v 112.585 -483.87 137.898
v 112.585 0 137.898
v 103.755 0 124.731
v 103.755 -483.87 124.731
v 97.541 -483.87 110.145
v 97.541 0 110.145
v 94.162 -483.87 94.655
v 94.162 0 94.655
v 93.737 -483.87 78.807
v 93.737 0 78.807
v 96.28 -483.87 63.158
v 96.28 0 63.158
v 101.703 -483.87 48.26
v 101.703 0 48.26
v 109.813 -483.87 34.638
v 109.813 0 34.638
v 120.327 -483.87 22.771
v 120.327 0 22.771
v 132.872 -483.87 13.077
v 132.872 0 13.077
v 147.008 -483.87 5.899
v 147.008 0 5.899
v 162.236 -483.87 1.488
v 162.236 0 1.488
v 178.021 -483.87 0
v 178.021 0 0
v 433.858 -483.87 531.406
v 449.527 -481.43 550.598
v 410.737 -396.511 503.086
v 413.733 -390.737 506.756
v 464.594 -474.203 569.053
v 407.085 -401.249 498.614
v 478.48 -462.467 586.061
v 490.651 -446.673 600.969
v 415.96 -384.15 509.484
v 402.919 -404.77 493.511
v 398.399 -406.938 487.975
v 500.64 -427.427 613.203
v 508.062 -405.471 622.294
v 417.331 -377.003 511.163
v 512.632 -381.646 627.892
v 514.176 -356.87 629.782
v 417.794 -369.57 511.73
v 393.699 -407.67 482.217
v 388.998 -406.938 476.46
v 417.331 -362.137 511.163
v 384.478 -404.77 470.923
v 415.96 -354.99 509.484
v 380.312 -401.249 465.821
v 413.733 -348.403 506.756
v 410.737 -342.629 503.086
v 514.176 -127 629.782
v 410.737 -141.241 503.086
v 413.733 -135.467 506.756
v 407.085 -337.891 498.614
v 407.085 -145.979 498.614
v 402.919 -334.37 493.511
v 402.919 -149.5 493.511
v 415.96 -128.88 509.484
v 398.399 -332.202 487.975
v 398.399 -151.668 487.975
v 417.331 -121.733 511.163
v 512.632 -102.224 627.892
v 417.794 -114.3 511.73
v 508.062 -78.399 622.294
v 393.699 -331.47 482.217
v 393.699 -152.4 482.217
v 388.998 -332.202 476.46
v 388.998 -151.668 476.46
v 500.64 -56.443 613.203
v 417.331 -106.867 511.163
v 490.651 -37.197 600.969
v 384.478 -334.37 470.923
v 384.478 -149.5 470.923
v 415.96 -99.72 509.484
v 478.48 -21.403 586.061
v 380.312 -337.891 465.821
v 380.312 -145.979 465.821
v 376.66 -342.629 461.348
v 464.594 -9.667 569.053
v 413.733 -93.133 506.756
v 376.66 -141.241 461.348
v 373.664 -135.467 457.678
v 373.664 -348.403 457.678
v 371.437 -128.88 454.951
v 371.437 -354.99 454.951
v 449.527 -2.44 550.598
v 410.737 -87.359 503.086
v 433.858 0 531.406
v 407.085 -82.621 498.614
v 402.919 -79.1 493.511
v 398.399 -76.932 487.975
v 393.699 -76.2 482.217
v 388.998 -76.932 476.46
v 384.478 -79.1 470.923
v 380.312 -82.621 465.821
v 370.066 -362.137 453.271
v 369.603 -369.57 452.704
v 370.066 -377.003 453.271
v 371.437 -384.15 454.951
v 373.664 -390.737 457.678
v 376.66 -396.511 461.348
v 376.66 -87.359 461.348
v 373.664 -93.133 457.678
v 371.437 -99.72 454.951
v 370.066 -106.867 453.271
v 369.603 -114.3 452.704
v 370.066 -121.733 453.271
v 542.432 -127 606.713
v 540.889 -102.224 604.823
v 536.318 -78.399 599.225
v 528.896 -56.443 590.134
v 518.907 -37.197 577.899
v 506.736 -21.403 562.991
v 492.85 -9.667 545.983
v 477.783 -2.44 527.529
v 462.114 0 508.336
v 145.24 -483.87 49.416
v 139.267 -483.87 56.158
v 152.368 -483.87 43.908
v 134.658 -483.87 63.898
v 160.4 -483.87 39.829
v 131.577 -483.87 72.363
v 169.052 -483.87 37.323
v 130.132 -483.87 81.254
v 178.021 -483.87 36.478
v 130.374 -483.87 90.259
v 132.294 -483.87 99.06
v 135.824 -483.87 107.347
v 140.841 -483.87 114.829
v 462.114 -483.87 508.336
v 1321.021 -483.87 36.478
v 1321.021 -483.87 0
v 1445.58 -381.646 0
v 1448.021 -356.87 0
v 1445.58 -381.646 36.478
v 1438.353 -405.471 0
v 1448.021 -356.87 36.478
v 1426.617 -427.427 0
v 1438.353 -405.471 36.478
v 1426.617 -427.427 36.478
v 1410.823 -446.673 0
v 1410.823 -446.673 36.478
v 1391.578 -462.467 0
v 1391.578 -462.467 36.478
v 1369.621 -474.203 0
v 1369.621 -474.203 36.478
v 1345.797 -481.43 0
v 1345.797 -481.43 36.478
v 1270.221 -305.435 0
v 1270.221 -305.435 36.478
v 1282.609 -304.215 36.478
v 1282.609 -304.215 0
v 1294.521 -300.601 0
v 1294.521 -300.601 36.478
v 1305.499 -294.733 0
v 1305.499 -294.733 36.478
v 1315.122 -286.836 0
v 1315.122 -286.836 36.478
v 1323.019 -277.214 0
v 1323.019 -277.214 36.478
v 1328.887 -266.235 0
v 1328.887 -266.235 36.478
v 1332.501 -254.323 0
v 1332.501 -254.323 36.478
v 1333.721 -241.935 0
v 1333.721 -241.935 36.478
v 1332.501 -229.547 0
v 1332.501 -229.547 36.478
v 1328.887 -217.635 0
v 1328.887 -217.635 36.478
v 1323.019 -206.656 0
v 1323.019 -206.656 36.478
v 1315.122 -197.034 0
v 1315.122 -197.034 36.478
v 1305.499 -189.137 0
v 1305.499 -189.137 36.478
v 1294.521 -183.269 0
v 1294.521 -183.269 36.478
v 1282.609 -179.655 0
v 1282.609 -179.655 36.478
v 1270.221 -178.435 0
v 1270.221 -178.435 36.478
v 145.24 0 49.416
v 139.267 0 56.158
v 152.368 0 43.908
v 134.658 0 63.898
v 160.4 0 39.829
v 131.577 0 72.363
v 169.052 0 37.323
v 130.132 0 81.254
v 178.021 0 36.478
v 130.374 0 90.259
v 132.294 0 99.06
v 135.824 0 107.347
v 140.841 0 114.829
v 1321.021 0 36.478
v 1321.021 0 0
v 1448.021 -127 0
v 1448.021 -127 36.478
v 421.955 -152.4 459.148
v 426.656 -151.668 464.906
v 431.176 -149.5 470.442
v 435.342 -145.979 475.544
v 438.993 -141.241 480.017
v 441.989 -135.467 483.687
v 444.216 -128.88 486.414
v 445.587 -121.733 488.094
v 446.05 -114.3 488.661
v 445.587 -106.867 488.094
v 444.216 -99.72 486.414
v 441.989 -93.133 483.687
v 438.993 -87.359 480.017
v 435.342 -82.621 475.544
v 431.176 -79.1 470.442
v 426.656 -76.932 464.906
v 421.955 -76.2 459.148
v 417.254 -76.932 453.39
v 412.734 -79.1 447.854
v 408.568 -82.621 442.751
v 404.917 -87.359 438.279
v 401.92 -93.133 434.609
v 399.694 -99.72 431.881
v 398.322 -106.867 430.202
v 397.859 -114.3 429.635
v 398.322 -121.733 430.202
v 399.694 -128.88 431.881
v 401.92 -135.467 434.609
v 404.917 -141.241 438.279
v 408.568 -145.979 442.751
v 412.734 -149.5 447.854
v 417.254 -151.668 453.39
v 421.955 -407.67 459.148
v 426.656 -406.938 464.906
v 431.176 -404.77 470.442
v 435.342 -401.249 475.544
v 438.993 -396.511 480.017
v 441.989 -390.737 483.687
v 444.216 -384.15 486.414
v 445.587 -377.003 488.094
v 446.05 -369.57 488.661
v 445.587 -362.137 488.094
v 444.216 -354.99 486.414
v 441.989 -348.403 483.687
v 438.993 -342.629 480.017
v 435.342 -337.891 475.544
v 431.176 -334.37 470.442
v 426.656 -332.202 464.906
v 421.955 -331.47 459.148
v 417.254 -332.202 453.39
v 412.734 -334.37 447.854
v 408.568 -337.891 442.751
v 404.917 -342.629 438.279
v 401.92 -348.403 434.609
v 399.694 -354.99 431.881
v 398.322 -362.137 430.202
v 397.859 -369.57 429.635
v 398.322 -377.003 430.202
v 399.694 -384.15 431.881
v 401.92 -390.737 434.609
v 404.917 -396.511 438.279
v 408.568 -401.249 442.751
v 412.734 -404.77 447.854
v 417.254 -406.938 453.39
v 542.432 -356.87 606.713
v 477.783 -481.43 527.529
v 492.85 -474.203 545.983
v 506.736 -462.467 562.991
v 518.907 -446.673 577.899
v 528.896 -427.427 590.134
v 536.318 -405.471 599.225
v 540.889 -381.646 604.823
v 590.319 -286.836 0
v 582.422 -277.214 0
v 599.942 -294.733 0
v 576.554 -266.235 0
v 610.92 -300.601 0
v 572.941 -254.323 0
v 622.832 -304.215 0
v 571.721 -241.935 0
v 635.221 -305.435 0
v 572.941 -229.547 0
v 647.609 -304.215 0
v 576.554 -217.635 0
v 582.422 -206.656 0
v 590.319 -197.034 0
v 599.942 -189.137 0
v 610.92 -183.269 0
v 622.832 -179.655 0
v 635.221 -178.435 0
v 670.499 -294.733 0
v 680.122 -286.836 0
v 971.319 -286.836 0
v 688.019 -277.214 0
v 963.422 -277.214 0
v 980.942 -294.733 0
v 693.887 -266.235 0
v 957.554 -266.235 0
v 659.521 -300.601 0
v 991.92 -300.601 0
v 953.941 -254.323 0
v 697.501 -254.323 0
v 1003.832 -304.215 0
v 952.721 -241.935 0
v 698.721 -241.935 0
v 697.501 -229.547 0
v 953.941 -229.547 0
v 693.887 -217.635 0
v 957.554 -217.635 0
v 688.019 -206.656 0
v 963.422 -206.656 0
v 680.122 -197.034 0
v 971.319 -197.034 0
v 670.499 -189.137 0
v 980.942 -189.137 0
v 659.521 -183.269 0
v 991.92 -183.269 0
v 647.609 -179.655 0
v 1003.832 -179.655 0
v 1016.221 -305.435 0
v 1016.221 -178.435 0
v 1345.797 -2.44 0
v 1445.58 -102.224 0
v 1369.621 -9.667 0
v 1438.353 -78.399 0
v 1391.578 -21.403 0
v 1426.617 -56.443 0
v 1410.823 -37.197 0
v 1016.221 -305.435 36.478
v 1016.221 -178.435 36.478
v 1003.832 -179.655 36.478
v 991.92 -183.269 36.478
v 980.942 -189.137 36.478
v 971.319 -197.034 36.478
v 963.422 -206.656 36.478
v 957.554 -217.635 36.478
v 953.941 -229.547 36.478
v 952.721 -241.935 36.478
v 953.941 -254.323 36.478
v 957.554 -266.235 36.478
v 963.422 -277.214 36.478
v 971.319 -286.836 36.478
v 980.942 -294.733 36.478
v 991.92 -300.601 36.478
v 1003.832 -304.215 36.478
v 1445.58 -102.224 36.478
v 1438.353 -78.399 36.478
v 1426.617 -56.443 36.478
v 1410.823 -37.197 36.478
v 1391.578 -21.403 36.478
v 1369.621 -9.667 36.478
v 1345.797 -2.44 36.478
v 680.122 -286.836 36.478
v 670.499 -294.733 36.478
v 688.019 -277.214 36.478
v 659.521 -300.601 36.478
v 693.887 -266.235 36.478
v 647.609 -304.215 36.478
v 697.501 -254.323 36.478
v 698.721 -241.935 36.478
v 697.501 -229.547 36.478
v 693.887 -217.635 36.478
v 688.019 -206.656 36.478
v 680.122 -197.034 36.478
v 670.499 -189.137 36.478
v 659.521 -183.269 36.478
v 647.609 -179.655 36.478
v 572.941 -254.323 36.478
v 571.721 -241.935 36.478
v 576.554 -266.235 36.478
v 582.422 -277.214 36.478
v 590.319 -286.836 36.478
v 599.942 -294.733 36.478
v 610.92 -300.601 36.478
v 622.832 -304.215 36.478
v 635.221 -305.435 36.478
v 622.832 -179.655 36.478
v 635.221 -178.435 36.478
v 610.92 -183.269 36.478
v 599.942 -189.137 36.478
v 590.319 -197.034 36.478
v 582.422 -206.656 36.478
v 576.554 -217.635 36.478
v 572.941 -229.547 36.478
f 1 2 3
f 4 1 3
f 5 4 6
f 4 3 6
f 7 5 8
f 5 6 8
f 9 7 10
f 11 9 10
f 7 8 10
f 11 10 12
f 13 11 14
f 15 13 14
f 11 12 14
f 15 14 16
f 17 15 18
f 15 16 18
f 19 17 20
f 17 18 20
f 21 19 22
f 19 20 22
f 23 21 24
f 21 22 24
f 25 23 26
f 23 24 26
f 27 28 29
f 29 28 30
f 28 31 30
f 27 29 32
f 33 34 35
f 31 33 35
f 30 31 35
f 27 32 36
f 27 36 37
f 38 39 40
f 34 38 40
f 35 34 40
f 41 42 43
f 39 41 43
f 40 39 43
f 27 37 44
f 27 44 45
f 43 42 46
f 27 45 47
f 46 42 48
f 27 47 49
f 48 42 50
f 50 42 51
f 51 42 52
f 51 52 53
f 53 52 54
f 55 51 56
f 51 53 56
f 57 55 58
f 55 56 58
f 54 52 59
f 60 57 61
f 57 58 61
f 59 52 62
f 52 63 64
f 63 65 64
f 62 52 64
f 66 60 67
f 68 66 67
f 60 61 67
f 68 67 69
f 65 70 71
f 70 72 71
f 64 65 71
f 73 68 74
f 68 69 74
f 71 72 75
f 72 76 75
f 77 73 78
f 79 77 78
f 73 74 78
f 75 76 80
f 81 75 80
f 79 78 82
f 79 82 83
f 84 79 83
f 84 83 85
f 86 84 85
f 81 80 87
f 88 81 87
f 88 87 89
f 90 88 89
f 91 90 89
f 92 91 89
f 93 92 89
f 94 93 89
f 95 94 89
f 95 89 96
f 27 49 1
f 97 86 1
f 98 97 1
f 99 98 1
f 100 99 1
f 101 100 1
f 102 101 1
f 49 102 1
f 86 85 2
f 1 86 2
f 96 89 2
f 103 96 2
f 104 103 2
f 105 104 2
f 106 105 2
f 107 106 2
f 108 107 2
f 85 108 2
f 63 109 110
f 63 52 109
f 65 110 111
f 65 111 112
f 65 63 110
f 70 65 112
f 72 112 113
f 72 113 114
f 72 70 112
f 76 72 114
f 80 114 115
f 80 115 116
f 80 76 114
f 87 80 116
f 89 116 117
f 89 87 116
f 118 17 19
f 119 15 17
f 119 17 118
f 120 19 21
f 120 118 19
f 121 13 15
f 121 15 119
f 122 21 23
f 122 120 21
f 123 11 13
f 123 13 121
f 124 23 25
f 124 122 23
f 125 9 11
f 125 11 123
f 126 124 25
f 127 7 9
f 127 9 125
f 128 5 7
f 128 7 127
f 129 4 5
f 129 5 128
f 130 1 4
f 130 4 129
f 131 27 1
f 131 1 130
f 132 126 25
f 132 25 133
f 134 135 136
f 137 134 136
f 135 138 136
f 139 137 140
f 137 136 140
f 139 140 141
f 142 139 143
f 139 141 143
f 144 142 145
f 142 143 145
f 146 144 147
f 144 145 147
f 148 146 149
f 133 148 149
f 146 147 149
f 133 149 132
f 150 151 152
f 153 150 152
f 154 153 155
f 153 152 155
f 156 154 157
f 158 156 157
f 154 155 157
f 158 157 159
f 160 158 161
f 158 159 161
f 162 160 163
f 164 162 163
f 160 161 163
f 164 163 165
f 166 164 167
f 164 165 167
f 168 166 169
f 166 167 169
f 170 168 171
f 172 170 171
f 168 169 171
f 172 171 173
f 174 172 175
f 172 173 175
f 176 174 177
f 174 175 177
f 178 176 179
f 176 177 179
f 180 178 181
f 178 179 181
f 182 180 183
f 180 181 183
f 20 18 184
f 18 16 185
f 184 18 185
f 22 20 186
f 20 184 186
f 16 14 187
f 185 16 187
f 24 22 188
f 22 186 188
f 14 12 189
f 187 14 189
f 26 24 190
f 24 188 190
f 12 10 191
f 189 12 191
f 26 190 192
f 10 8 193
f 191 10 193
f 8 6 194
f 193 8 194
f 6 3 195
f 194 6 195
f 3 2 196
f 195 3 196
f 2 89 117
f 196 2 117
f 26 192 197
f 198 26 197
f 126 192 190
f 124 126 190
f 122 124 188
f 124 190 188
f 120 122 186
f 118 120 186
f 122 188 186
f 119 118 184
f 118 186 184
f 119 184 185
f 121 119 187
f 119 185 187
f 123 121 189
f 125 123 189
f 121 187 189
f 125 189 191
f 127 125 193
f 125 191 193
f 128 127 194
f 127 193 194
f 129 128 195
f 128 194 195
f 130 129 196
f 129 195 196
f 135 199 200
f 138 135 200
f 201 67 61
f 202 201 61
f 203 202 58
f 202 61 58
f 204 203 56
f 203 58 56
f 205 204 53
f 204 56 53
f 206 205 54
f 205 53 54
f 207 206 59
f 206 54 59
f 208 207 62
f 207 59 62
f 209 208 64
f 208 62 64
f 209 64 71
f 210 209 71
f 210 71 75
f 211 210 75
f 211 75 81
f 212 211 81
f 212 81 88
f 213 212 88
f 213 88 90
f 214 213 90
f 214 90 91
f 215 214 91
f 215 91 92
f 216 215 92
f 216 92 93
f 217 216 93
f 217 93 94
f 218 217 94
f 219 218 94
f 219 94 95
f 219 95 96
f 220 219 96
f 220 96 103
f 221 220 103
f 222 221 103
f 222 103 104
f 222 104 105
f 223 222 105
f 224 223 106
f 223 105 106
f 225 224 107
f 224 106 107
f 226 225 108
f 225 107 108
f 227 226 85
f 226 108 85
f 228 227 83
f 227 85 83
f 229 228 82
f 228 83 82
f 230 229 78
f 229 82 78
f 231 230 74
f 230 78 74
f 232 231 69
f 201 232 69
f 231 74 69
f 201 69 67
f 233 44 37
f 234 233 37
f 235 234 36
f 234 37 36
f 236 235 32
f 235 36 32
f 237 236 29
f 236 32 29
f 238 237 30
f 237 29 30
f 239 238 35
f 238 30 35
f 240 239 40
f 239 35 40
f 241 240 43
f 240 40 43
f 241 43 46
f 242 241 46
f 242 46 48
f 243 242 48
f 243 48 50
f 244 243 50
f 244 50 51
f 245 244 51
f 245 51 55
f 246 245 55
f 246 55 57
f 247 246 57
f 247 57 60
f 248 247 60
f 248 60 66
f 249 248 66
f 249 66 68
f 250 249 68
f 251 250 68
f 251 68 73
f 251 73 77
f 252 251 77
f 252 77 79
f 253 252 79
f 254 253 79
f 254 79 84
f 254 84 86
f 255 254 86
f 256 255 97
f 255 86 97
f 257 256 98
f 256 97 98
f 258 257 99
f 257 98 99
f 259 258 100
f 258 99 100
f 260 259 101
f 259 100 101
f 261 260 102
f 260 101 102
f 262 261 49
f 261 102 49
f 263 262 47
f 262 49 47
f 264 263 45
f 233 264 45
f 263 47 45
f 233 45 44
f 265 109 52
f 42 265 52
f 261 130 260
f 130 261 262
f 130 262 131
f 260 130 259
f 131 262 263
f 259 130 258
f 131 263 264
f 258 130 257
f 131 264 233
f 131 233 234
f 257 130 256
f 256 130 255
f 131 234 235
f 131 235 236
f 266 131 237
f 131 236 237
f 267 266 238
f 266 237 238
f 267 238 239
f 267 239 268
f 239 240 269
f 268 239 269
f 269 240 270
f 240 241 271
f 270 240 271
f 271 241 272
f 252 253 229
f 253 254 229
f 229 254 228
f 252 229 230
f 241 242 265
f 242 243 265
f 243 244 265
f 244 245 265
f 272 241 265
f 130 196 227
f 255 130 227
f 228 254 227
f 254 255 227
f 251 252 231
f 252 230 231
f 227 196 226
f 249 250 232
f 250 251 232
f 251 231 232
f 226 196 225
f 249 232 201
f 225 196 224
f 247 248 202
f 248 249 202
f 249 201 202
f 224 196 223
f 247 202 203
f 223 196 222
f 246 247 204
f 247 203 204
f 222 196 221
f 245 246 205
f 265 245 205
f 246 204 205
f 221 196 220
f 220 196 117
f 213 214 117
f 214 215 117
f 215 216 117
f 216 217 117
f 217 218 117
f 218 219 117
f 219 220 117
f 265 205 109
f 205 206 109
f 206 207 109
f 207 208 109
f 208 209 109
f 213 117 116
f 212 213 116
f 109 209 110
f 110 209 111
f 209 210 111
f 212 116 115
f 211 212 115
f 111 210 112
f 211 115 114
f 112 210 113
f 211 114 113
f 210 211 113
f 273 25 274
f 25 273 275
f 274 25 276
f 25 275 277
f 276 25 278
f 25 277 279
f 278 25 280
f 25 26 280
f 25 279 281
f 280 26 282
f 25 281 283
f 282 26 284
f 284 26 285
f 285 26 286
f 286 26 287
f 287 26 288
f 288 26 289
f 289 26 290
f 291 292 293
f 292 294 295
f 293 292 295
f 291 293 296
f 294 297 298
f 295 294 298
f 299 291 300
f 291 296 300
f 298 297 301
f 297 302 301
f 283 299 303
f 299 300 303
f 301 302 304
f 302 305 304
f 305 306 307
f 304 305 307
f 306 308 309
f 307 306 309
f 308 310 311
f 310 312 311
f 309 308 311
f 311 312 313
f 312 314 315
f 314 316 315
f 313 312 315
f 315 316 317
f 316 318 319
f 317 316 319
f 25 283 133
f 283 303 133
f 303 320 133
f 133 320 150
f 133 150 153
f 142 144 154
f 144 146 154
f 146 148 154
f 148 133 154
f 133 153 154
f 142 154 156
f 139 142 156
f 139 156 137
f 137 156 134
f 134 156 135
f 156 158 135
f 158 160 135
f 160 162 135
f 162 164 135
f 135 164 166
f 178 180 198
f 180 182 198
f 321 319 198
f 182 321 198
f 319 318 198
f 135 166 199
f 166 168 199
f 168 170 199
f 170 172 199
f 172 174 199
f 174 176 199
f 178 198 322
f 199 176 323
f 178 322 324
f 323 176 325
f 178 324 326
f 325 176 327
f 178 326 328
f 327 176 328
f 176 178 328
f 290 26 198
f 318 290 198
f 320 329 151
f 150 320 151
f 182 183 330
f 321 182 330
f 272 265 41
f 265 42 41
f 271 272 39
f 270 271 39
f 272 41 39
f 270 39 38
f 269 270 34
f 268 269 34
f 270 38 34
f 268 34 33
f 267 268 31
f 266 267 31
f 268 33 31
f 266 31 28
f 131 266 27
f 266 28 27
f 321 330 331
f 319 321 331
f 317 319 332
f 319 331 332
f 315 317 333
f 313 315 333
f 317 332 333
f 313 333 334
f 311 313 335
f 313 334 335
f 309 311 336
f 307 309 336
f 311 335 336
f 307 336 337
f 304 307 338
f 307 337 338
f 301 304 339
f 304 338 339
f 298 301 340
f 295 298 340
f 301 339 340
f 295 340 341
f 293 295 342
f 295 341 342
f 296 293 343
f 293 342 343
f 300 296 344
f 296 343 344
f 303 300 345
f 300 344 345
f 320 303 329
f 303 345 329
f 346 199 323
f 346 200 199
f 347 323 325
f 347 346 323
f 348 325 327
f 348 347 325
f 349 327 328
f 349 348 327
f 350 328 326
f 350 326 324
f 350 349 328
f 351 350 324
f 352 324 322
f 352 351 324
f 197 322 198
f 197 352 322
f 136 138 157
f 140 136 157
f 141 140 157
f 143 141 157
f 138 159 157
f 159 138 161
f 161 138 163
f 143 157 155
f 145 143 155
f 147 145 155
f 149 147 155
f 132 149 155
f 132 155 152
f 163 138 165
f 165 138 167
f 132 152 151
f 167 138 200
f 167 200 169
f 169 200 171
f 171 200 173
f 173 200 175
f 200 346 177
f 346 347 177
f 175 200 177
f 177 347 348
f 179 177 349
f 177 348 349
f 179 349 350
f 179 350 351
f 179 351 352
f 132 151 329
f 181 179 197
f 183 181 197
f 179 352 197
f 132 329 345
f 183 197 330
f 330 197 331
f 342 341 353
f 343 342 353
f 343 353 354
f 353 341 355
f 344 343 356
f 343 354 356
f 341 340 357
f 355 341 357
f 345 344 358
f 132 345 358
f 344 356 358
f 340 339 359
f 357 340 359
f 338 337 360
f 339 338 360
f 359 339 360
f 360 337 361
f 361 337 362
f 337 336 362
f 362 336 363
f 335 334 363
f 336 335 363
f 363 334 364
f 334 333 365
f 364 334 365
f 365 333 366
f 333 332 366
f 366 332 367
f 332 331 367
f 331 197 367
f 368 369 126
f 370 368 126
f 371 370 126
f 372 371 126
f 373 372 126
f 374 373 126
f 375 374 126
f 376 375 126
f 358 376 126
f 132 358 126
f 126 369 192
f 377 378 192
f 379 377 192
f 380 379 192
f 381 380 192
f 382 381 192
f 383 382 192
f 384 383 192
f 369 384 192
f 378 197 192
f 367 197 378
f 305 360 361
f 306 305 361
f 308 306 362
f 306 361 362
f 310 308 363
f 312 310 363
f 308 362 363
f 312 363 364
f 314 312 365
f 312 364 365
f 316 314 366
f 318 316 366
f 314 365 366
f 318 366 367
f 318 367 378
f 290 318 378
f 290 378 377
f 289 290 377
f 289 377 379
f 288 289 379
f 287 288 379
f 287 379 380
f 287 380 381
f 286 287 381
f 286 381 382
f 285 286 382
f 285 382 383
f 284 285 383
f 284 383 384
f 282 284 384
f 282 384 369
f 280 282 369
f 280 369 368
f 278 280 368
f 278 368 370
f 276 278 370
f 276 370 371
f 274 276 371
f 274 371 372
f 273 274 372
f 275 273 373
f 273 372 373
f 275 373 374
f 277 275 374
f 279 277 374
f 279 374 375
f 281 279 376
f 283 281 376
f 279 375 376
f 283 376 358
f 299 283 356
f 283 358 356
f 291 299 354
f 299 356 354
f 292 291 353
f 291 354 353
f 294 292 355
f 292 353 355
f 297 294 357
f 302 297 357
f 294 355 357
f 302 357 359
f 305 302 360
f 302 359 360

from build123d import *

# Parameters (mm, degrees)
F1_DEPTH = 483.87
F2_R     = 127
F3_R     = 38.1
F4_DEPTH = 99.06
F5_R     = 63.5
F6_DEPTH = 360.68


with BuildPart() as f1:
    # F0 (on Front) → F1 (new body)
    with BuildSketch(Plane.XZ):
        with BuildLine():
            Line((514.1757349964, 629.7824745688), (112.5849840774, 137.8984752597))
            ThreePointArc((112.5849840774, 137.8984752597), (101.7025756268, 48.26), (178.0206957594, 0))
            Line((178.0206957594, 0), (1448.0206957594, 0))
            Line((1448.0206957594, 0), (1448.0206957594, 36.4776443297))
            Line((1448.0206957594, 36.4776443297), (178.0206957594, 36.4776443297))
            ThreePointArc((178.0206957594, 36.4776443297), (134.6581275023, 63.8980988751), (140.8413141219, 114.8290507272))
            Line((140.8413141219, 114.8290507272), (542.4320650409, 606.7130500363))
            Line((542.4320650409, 606.7130500363), (514.1757349964, 629.7824745688))
        make_face()
    extrude(amount=F1_DEPTH)

    # F2
    f2_edges = [f1.edges().sort_by_distance(p)[0] for p in [
        (1448.020696, -483.87, 18.238822),
        (1448.020696, 0, 18.238822),
        (528.3039, -483.87, 618.247762),
        (528.3039, 0, 618.247762),
    ]]
    fillet(f2_edges, radius=F2_R)

    # F3 (on face) → F4 (cut)
    with BuildSketch(Plane(origin=(0, 0, 0), x_dir=(0, -1, 0), z_dir=(-0.7746204714, 0, 0.6324263794))):
        with Locations((114.3, 622.5206957594)):
            Circle(F3_R)
        with Locations((369.57, 622.5206957594)):
            Circle(F3_R)
    extrude(amount=-F4_DEPTH, mode=Mode.SUBTRACT)

    # F5 (on face) → F6 (cut)
    with BuildSketch(Plane.XY.offset(36.4776443297)):
        with Locations((635.2206957594, -241.935)):
            Circle(F5_R)
        with BuildLine():
            ThreePointArc((1270.2206957594, -305.435), (1333.7206957594, -241.935), (1270.2206957594, -178.435))
            Line((1270.2206957594, -178.435), (1016.2206957594, -178.435))
            ThreePointArc((1016.2206957594, -178.435), (952.7206957594, -241.935), (1016.2206957594, -305.435))
            Line((1016.2206957594, -305.435), (1270.2206957594, -305.435))
        make_face()
    extrude(amount=-F6_DEPTH, mode=Mode.SUBTRACT)


solid = f1.part
